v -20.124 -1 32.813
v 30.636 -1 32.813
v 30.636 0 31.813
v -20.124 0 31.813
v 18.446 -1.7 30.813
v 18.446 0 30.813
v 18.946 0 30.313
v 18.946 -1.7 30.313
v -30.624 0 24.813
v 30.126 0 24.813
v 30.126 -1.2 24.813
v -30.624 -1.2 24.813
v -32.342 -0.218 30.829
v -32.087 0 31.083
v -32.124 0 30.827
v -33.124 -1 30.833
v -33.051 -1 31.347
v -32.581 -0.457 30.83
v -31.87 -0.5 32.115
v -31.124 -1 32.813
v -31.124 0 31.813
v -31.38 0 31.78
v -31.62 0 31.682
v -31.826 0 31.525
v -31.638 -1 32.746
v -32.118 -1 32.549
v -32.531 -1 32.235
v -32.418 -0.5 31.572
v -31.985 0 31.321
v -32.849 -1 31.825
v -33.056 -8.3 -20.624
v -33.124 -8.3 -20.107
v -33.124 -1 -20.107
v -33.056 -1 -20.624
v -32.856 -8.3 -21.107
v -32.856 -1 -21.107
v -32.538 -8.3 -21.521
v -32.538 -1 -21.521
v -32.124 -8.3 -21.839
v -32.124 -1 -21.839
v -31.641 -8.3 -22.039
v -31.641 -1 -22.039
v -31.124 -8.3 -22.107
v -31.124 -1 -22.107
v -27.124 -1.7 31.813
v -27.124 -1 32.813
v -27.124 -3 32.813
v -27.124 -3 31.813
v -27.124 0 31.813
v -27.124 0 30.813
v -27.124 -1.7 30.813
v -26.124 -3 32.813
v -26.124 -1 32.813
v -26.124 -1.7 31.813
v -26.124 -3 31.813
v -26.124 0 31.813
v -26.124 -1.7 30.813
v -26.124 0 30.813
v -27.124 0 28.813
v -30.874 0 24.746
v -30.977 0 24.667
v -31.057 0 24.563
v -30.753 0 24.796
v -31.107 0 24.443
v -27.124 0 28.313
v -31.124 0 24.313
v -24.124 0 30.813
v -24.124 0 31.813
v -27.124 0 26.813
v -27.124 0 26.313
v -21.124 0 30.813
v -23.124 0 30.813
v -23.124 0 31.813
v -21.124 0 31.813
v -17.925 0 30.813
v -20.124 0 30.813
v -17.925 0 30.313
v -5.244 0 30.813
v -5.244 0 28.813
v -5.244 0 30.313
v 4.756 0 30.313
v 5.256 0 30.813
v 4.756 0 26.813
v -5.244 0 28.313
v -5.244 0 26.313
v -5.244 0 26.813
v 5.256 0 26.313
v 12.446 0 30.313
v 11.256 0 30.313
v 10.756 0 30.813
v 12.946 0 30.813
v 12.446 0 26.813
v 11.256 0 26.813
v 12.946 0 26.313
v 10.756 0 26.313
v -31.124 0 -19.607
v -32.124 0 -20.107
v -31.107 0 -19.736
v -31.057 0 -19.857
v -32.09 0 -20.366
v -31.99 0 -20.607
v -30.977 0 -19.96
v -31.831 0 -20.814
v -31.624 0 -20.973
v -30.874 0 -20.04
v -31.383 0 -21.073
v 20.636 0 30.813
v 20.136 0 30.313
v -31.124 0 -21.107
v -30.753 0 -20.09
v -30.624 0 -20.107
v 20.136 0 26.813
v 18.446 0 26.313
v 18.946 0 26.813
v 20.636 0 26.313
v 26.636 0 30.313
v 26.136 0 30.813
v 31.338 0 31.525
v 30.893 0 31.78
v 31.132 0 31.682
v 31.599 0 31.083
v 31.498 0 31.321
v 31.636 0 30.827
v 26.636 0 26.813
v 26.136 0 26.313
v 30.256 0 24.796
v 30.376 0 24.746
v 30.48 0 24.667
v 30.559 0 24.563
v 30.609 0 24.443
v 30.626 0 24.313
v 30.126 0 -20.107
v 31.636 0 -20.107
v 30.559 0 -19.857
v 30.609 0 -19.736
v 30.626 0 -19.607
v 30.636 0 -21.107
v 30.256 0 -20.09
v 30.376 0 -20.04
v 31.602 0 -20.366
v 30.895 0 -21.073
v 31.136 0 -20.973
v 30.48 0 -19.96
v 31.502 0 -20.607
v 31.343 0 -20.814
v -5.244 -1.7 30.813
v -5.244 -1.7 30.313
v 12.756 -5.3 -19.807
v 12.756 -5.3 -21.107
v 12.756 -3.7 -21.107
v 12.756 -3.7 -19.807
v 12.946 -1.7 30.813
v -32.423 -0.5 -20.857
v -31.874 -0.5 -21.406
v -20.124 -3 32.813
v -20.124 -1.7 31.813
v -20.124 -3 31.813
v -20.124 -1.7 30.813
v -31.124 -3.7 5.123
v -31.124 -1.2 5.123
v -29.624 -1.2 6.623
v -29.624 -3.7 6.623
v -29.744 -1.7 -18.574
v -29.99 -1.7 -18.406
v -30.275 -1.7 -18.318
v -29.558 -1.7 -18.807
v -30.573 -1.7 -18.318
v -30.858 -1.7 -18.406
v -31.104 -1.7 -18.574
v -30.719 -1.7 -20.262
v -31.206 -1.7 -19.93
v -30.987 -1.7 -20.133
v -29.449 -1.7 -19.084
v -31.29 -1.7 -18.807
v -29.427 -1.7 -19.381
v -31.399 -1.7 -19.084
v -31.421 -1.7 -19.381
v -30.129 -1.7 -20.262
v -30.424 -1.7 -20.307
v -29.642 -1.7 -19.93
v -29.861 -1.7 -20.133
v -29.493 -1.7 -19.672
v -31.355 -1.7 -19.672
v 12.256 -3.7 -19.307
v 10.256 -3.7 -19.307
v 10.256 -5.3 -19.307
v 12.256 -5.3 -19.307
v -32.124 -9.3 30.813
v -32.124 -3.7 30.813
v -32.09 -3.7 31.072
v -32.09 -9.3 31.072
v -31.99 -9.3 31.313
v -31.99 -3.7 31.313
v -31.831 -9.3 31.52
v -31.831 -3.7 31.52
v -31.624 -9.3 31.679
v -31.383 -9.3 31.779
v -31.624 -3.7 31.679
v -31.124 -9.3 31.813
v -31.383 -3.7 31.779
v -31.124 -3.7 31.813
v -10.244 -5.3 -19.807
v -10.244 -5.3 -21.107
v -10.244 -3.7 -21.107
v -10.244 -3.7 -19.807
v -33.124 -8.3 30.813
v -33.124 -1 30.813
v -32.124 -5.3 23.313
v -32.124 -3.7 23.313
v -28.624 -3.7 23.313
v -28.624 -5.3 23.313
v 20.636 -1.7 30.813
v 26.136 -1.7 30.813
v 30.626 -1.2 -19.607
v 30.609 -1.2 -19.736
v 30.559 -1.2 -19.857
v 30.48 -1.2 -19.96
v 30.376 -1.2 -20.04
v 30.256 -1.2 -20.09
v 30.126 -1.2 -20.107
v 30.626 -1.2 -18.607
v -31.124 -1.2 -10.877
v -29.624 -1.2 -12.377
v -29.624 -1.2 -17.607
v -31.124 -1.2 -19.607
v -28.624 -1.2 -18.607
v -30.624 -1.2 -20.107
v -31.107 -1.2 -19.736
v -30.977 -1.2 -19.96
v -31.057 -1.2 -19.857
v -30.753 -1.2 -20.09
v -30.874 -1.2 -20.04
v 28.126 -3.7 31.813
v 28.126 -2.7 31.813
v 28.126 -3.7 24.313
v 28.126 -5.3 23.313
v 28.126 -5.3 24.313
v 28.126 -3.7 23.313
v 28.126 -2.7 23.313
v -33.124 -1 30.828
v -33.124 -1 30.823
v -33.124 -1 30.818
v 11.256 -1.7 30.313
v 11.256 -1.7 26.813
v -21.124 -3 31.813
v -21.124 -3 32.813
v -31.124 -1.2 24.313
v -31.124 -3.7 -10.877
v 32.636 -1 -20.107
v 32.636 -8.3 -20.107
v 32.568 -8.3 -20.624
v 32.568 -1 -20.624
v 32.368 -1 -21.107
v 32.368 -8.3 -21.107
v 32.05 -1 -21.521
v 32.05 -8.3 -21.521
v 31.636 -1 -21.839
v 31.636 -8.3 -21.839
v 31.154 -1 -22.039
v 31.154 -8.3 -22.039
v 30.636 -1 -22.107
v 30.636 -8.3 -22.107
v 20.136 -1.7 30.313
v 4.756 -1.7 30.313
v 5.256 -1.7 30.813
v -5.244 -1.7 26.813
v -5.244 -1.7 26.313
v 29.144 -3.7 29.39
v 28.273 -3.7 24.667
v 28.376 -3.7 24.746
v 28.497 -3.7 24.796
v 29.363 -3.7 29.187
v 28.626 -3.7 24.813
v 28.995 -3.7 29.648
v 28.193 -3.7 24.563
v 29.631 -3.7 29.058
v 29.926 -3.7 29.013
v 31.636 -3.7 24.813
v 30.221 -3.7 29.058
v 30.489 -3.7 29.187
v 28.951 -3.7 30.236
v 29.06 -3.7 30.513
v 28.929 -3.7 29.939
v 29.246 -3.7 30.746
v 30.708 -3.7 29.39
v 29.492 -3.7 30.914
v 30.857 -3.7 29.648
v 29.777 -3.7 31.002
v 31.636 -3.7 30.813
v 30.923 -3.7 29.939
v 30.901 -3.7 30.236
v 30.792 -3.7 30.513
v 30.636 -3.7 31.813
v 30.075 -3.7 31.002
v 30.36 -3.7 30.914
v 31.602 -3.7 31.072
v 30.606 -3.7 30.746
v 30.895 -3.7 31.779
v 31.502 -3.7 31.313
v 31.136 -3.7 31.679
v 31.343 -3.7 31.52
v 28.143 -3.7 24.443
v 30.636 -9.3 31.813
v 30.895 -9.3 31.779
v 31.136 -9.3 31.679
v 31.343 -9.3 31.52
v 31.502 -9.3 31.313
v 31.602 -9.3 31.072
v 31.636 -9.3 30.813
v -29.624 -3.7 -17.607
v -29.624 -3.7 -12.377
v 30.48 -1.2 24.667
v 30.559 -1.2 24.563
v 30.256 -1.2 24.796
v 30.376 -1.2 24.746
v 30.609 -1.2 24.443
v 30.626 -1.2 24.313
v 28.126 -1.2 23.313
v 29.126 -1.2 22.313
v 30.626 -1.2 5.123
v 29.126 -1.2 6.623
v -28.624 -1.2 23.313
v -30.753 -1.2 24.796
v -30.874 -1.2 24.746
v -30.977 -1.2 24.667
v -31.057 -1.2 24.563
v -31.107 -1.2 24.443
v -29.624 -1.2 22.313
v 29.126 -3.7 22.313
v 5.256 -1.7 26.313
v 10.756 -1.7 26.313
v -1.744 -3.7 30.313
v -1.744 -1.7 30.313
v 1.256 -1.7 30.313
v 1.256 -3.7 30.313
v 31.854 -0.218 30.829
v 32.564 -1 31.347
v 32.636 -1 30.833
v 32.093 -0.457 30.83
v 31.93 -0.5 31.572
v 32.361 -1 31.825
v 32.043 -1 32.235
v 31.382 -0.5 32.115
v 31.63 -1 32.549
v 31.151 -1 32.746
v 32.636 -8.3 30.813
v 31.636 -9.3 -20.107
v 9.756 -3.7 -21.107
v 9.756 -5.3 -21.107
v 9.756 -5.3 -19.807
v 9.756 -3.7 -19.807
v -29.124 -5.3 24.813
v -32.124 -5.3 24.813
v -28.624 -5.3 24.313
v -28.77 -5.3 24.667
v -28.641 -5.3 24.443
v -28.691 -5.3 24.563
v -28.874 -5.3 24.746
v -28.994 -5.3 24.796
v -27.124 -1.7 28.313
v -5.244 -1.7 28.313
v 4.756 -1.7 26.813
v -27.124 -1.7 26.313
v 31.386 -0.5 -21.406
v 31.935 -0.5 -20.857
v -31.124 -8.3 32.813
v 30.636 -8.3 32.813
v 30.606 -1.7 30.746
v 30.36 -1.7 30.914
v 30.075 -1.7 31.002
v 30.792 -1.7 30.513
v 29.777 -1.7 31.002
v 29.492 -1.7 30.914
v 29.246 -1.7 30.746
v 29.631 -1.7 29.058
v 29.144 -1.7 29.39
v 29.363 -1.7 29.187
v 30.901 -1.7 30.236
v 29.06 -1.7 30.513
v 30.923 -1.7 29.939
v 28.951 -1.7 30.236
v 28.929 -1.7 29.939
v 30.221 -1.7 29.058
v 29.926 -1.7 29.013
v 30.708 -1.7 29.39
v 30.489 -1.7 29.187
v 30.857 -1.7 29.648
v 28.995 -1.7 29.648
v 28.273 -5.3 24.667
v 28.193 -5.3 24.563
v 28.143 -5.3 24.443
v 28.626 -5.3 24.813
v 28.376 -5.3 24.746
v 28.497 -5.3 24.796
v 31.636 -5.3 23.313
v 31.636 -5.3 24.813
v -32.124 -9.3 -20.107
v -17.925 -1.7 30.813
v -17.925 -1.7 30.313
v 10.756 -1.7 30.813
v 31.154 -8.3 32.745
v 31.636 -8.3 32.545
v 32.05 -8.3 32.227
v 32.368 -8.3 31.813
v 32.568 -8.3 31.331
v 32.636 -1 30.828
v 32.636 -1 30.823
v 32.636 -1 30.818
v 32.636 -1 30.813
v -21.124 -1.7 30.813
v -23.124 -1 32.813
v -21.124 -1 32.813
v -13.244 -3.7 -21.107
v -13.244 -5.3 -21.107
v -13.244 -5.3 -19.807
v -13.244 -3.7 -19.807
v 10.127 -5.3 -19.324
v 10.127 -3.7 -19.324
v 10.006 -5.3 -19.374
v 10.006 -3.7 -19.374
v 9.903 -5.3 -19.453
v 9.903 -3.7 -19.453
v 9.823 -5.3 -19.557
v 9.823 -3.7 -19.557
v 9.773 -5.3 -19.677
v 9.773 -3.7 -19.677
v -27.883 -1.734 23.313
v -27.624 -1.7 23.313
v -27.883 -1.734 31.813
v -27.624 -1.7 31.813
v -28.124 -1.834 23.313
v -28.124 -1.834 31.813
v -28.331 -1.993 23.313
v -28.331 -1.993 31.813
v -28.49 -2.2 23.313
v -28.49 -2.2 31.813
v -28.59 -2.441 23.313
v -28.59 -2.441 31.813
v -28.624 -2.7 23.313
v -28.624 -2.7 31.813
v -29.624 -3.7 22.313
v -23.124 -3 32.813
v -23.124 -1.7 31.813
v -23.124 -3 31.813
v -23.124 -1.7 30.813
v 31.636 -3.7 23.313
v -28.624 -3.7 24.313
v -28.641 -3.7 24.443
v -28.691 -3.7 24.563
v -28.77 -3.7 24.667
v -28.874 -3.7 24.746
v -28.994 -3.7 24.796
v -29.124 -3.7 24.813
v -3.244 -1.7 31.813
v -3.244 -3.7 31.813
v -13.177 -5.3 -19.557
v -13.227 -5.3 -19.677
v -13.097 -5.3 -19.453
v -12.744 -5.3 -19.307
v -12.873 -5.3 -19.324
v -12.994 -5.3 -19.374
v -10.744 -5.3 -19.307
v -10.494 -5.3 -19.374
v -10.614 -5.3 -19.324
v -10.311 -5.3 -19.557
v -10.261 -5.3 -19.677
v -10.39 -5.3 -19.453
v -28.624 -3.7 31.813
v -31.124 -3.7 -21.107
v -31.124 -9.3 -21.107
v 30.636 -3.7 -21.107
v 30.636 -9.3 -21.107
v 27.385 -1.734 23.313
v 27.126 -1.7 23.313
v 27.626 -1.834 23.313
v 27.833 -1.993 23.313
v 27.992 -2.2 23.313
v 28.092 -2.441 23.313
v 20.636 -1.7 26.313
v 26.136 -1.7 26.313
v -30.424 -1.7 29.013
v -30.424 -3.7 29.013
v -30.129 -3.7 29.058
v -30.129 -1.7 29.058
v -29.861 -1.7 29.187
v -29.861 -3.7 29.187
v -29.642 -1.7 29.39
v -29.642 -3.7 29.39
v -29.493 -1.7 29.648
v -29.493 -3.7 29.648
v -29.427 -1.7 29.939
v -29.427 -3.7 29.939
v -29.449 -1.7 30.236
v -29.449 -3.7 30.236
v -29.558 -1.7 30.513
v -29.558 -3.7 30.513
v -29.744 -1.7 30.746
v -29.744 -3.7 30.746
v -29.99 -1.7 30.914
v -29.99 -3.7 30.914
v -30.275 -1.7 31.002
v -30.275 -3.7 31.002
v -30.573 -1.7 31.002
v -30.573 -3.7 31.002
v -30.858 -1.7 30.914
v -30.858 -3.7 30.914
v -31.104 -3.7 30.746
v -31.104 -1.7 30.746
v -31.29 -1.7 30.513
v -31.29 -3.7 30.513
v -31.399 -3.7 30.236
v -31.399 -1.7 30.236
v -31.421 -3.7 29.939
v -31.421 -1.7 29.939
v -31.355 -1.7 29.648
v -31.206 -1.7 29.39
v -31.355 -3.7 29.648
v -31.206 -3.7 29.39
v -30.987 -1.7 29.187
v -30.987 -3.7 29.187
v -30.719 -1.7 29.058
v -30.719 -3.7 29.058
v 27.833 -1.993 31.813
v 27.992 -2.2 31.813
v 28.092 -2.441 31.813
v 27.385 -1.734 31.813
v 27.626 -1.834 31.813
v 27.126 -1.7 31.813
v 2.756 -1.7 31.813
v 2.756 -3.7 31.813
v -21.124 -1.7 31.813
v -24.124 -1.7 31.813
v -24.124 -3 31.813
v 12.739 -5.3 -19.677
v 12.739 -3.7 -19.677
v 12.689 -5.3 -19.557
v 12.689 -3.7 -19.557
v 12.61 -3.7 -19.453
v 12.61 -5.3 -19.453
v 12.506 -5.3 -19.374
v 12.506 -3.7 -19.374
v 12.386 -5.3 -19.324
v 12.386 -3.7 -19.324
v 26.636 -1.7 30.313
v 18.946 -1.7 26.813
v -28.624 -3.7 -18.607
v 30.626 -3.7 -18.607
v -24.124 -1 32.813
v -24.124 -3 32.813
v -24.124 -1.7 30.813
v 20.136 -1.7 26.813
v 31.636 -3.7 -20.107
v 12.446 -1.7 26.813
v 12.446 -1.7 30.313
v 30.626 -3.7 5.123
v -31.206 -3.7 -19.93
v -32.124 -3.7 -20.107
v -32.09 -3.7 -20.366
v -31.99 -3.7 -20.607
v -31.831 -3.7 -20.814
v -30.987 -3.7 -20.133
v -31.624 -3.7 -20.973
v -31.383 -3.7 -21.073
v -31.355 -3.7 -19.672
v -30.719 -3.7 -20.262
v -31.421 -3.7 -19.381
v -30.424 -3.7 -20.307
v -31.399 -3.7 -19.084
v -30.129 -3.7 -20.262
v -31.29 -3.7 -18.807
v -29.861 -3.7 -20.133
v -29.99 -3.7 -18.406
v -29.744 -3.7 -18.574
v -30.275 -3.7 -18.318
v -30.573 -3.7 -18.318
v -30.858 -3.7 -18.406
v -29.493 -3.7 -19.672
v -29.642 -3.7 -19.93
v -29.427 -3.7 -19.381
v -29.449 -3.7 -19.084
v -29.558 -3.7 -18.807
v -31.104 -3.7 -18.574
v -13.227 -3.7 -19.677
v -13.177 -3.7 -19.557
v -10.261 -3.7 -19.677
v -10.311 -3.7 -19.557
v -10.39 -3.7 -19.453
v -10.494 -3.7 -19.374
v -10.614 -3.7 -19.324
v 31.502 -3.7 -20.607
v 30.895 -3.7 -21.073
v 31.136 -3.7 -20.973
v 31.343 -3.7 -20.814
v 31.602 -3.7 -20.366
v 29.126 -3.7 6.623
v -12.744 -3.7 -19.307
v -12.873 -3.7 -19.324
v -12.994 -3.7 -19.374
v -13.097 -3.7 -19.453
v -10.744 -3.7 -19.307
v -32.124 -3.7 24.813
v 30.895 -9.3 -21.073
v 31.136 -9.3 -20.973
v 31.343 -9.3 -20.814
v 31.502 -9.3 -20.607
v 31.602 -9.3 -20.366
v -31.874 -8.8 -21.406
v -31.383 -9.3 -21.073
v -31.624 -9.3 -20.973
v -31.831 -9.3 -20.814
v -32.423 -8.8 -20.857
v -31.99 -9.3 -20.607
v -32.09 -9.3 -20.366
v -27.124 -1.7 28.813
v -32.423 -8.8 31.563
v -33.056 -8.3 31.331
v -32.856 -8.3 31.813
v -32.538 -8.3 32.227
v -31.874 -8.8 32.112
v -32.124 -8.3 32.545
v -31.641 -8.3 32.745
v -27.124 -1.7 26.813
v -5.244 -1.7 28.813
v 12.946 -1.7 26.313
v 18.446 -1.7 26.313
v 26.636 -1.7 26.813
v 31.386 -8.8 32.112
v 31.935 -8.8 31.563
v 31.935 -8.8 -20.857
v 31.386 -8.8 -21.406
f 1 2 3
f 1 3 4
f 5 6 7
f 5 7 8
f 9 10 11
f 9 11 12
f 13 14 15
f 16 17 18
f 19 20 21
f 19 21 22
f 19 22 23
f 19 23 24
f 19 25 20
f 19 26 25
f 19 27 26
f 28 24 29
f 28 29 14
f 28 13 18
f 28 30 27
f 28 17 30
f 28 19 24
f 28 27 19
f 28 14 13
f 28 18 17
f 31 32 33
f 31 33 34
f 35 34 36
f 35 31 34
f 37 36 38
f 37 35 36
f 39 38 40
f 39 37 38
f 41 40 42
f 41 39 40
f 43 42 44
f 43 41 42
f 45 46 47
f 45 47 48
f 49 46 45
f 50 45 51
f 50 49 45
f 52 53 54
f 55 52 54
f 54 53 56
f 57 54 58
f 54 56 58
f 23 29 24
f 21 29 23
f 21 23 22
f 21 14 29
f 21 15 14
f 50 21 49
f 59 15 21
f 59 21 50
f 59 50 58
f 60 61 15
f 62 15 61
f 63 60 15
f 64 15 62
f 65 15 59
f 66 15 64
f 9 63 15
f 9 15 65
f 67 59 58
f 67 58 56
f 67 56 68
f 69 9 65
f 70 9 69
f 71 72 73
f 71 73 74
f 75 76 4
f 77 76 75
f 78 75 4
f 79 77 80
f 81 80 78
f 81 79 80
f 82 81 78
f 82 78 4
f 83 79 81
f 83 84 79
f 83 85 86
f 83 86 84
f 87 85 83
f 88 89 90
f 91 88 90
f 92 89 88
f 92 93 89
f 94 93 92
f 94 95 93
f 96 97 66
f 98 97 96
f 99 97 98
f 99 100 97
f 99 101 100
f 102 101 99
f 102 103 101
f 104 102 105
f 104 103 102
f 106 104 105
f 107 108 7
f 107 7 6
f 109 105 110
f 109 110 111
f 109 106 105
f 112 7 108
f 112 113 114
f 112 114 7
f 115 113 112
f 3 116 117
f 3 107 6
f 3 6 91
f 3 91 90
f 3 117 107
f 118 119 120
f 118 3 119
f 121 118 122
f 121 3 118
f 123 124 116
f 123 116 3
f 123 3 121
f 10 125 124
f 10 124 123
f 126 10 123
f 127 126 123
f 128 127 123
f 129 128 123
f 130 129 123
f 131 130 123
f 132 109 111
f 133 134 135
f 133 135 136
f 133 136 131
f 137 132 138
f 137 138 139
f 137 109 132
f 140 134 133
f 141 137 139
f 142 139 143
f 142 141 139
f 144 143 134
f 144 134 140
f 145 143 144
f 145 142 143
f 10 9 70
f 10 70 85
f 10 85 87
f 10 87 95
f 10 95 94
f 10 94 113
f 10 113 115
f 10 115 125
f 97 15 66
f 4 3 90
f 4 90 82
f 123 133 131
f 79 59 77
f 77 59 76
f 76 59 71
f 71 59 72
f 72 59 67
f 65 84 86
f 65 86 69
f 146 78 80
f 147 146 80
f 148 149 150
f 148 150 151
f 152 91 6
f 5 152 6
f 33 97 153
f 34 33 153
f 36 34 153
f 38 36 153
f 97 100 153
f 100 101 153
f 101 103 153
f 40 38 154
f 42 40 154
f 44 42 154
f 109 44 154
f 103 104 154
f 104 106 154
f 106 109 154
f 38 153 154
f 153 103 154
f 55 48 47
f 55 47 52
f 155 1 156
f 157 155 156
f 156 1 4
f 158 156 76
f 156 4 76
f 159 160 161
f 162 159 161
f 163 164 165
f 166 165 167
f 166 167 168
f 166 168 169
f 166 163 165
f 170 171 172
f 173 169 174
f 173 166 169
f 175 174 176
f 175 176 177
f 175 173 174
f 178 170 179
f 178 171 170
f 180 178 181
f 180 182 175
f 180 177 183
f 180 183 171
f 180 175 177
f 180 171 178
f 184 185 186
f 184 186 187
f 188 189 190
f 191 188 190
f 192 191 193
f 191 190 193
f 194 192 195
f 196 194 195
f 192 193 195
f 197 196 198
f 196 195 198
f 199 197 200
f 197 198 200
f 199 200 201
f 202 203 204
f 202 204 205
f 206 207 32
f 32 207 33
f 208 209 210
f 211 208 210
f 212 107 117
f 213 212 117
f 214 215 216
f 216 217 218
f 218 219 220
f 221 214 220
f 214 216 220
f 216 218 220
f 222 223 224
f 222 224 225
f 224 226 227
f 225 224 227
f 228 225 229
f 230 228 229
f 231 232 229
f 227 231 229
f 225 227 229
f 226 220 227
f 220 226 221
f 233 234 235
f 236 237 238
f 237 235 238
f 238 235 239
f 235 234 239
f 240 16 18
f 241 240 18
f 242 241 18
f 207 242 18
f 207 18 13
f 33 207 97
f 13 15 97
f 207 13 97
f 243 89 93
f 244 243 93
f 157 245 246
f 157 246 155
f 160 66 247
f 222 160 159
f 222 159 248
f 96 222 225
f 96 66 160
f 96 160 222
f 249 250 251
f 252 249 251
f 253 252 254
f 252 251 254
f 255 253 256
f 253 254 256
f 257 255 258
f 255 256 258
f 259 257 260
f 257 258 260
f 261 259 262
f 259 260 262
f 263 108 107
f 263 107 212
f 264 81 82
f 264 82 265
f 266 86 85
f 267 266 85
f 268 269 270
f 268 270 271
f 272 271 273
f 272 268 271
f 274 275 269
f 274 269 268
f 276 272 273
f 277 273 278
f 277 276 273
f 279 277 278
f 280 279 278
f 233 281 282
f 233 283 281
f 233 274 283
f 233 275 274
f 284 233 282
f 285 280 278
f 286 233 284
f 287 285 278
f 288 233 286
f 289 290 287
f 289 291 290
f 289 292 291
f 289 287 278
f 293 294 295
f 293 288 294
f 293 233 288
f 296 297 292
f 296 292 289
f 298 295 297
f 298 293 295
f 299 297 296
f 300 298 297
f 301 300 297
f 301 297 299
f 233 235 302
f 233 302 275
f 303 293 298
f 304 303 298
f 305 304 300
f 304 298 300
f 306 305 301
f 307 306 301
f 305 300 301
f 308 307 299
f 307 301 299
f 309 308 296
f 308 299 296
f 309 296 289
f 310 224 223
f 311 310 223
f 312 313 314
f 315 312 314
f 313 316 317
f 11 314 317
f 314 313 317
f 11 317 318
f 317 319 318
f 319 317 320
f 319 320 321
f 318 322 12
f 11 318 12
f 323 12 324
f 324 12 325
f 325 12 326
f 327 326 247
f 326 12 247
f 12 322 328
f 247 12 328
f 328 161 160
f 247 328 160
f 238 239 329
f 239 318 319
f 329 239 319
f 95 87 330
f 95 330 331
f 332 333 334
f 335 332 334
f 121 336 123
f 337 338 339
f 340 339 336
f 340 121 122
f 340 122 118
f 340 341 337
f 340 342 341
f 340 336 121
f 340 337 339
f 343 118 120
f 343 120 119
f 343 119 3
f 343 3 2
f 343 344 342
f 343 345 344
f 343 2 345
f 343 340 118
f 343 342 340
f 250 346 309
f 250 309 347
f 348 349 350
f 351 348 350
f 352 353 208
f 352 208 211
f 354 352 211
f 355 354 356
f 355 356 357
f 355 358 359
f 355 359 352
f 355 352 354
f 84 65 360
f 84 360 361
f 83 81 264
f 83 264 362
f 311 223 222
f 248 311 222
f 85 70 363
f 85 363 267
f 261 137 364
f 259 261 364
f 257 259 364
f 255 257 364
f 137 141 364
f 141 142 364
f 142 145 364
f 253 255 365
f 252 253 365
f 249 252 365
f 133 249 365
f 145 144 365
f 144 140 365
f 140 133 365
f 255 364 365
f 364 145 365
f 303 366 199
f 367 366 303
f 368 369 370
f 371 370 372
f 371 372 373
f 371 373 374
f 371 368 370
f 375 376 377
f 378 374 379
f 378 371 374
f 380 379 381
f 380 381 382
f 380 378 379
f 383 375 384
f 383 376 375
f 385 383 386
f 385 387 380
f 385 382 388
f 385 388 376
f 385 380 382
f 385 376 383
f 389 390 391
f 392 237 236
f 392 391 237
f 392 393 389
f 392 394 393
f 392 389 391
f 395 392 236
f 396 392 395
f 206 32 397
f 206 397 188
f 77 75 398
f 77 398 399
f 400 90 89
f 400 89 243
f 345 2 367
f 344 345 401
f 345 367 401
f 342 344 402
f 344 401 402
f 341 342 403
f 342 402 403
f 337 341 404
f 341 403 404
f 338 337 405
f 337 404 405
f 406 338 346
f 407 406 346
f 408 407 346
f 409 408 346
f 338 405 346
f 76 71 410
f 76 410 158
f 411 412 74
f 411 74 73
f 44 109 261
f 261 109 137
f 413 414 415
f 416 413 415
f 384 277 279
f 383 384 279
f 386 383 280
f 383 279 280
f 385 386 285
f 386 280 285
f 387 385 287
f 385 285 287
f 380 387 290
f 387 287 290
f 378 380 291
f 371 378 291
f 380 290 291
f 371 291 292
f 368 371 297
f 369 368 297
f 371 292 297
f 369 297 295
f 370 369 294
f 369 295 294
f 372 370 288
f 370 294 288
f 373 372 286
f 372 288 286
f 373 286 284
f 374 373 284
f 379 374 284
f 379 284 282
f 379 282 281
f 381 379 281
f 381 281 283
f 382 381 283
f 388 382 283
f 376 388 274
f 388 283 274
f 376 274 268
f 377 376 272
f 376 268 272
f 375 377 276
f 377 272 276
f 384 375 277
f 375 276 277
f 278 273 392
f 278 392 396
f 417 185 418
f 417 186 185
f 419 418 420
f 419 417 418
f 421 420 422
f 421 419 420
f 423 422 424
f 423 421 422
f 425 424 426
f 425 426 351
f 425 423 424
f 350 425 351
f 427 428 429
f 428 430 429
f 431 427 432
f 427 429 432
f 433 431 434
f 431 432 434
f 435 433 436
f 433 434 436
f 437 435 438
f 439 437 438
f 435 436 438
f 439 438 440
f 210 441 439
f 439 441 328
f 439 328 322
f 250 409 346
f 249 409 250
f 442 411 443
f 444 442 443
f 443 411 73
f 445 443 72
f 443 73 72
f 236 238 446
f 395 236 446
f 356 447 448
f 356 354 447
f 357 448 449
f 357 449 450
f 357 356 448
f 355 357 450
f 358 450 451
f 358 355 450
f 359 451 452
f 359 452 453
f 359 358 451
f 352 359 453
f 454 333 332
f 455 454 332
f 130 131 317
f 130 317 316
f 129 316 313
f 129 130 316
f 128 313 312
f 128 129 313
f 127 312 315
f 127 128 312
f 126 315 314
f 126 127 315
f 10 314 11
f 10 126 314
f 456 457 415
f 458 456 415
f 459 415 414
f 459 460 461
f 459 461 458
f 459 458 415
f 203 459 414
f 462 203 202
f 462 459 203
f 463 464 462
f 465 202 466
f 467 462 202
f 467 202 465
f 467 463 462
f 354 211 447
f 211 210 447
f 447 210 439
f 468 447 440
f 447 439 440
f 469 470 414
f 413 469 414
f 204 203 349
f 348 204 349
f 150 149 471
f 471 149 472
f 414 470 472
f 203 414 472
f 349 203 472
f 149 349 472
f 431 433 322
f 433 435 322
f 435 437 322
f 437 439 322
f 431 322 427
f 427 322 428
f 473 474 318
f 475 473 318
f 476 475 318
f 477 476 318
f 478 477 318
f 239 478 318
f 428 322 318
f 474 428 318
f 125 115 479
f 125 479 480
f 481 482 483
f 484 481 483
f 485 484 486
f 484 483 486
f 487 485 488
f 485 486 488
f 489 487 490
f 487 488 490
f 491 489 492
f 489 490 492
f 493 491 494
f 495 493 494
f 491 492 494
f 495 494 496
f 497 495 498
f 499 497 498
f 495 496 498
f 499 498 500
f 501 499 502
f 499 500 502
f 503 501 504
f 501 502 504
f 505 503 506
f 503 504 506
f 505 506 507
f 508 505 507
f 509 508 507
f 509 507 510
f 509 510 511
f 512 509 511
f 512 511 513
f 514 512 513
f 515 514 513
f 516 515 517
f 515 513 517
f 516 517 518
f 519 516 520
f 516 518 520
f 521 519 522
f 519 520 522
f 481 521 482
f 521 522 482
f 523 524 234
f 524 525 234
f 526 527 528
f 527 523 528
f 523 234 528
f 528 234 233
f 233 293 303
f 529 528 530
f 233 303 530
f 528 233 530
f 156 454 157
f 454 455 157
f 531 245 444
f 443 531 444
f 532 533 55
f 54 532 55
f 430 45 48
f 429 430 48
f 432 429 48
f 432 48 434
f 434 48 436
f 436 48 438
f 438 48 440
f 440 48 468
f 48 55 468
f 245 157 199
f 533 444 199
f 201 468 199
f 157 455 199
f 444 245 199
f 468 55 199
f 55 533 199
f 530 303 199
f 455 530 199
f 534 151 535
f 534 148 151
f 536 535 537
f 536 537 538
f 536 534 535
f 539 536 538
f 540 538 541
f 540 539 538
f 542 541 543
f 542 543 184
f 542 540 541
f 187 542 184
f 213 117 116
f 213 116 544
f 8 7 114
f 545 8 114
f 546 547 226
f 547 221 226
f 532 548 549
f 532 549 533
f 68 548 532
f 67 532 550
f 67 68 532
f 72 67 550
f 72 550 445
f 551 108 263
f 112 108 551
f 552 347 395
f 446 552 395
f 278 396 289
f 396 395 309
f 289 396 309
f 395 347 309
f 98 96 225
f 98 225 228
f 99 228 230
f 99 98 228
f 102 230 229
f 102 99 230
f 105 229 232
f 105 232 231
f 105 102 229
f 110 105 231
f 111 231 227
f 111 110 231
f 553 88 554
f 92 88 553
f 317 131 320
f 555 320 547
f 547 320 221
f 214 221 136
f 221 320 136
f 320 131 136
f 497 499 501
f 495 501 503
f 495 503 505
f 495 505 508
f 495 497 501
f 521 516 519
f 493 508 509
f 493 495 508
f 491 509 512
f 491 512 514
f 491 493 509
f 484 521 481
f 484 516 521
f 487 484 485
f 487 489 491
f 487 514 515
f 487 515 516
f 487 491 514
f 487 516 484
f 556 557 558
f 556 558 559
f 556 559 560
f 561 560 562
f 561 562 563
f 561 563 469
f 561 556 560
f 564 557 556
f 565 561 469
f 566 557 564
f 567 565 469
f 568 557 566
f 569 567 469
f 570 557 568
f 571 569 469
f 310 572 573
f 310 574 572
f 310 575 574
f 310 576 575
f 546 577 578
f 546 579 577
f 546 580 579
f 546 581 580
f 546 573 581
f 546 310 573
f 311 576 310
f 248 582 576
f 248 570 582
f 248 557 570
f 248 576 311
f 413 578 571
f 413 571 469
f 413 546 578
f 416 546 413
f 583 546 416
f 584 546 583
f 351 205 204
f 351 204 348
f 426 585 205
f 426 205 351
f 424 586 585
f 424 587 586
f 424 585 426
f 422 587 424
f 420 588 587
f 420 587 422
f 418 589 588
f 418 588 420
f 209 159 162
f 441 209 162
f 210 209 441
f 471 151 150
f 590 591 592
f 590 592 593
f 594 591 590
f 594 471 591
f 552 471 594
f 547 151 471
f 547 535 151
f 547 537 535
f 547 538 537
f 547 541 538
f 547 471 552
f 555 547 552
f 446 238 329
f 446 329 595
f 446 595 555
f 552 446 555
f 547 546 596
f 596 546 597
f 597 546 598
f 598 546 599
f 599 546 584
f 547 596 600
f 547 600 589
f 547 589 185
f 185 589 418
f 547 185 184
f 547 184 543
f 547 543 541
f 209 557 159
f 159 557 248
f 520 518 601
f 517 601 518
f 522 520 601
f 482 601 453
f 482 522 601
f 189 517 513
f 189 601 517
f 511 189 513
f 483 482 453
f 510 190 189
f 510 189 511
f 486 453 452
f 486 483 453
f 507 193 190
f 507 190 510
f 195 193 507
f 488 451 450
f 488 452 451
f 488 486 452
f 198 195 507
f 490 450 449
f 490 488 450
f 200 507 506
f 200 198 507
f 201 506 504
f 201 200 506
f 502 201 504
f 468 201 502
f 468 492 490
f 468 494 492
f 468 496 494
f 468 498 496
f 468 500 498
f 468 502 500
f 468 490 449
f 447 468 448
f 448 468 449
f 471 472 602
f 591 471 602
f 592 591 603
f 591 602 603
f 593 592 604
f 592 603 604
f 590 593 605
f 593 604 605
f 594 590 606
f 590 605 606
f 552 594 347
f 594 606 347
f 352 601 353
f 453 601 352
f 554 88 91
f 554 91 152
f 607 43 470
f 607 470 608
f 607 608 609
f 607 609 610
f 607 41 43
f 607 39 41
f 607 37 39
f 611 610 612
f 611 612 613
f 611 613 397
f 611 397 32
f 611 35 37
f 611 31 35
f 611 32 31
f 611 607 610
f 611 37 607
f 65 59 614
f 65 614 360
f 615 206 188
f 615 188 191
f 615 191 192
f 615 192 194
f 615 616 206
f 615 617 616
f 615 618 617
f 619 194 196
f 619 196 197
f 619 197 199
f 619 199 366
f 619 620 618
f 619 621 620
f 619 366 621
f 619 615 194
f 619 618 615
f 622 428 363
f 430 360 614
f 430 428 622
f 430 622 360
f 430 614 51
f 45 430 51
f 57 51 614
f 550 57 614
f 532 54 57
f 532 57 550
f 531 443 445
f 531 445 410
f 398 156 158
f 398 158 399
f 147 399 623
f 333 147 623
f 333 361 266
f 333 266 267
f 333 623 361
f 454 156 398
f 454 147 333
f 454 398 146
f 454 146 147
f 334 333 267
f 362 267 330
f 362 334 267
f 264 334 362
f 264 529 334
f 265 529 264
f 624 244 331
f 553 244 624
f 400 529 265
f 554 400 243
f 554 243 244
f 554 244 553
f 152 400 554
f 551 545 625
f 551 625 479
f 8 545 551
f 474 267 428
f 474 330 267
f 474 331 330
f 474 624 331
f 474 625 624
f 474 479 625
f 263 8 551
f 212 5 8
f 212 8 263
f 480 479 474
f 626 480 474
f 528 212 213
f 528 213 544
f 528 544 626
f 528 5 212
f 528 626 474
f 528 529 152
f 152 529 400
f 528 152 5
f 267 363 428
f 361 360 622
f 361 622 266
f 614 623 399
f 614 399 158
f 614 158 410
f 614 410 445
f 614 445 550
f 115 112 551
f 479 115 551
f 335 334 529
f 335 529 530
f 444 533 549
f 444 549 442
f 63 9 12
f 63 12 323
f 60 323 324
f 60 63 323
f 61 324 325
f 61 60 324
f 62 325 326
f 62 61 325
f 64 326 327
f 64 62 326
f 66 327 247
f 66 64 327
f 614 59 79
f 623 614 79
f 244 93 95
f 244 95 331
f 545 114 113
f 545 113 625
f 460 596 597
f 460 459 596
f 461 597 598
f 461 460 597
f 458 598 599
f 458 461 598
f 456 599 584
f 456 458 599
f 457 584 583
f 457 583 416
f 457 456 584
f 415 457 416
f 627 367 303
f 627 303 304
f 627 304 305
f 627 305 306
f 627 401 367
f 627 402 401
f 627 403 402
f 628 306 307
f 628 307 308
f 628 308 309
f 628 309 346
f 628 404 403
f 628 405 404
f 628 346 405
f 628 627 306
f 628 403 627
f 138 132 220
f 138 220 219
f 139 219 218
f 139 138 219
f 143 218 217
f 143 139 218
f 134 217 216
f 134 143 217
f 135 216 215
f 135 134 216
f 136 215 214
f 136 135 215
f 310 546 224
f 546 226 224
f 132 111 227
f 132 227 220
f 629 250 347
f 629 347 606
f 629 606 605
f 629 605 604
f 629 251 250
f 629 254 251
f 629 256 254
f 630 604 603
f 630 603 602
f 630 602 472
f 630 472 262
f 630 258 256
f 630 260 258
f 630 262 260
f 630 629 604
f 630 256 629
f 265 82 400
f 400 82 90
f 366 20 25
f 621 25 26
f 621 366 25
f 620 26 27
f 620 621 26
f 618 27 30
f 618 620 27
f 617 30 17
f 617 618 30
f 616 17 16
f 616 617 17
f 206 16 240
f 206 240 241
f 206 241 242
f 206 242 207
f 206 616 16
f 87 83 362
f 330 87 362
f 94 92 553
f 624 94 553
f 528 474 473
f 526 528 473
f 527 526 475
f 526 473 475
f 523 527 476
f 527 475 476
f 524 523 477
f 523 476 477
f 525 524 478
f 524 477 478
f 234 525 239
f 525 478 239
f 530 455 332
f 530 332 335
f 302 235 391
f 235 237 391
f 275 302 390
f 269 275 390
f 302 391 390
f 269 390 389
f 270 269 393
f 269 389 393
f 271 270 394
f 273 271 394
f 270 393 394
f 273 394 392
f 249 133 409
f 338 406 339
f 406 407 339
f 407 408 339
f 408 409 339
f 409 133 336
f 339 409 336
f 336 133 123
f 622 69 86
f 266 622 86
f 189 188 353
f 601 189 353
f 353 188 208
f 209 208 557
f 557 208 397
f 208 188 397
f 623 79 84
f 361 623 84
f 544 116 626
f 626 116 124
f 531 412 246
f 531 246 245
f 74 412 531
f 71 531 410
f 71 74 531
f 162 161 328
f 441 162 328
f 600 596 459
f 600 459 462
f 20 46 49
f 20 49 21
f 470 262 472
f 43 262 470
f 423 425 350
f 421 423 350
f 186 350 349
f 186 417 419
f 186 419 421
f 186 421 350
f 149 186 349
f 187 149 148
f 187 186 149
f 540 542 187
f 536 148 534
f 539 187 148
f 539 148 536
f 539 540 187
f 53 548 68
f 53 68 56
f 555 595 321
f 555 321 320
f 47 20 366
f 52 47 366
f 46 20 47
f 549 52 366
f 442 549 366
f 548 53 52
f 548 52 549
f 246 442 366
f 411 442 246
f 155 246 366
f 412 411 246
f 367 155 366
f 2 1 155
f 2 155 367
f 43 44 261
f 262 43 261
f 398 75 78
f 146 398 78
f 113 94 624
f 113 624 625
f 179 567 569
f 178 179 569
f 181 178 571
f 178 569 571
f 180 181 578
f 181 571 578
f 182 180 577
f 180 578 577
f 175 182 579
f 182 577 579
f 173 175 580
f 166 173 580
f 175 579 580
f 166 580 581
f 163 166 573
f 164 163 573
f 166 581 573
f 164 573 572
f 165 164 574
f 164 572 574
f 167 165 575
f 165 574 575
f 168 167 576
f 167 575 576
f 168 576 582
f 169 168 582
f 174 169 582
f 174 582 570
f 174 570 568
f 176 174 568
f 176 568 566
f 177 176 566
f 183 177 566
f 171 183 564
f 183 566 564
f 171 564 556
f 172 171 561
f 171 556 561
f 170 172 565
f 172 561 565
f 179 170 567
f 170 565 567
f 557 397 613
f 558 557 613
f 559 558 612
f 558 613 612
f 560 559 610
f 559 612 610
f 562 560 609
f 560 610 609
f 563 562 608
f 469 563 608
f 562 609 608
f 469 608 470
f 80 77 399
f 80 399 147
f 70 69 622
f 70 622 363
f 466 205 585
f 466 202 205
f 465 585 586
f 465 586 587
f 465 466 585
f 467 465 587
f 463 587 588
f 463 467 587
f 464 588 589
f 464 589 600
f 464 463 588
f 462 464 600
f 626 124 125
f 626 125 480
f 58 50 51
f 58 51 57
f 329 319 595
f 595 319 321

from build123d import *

# Parameters (mm, degrees)
SKETCH_1_W           = 65.76
SKETCH_1_H           = 54.92
EXTRUDE_1_DEPTH      = 9.3
FILLET_1_R           = 2
CUT_EXTRUDE_1_DEPTH  = 1.2
SKETCH_3_W           = 58.75
SKETCH_3_H           = 41.92
CUT_EXTRUDE_2_DEPTH  = 1
CHAMFER_2_SIZE       = 1
SKETCH_7_W           = 2
SKETCH_7_H           = 41.92
CUT_EXTRUDE_5_DEPTH  = 48.162577855
CUT_EXTRUDE_6_DEPTH  = 5.8
SKETCH_10_W          = 1.5
SKETCH_10_H          = 22.23
CUT_EXTRUDE_7_DEPTH  = 1
CHAMFER_8_SIZE       = 3
CHAMFER_9_SIZE       = 1
FILLET_2_R           = 2
CHAMFER_11_SIZE      = 1
FILLET_3_R           = 1
SKETCH_14_W          = 12.681422007
SKETCH_14_H          = 0.5
SKETCH_14_W_2        = 21.88
SKETCH_14_W_3        = 6.5
SKETCH_14_H_2        = 4.5
CUT_EXTRUDE_9_DEPTH  = 48.543545828
CHAMFER_14_SIZE      = 0.5
SKETCH_14_3_W        = 1
SKETCH_14_3_H        = 2
CUT_EXTRUDE_10_DEPTH = 3
CUT_EXTRUDE_11_DEPTH = 1.8
EXTRUDE_3_DEPTH      = 2
FILLET_5_R           = 1
SKETCH_23_R          = 1
CUT_EXTRUDE_14_DEPTH = 2
SKETCH_23_3_W        = 3
SKETCH_23_3_H        = 1.8
SKETCH_23_3_W_2      = 3.5
SKETCH_23_3_H_2      = 1.5
SKETCH_23_3_W_3      = 3.51
EXTRUDE_4_DEPTH      = 1.6
FILLET_7_R           = 0.5
SKETCH_26_W          = 3
SKETCH_26_H          = 1.5
EXTRUDE_6_DEPTH      = 2
CHAMFER_18_SIZE      = 1.5
CUT_EXTRUDE_15_DEPTH = 48.323448204
CHAMFER_19_SIZE      = 1


# Some blends are built 0.0001 mm under size
with BuildPart() as part:
    # 草图1 → 凸台-拉伸1 (new body)
    with BuildSketch(Plane(origin=(0, 0, 0), x_dir=(1, 0, 0), z_dir=(0, 1, 0))):
        with Locations((-0.243849372, -5.353249651)):
            Rectangle(SKETCH_1_W, SKETCH_1_H)
    extrude(amount=-EXTRUDE_1_DEPTH)

    # 圆角1
    fillet_1_edges = [part.edges().sort_by_distance(p)[0] for p in [
        (-33.123849372, -4.65, -22.106750349),
        (32.636150628, -4.65, -22.106750349),
    ]]
    fillet(fillet_1_edges, radius=FILLET_1_R)

    # 草图2 → 切除-拉伸1 (cut)
    with BuildSketch(Plane(origin=(0, 0, 0), x_dir=(1, 0, 0), z_dir=(0, 1, 0))):
        with BuildLine():
            Line((-30.623849372, 20.106750349), (30.126150628, 20.106750349))
            ThreePointArc((30.126150628, 20.106750349), (30.479704018, 19.960303739), (30.626150628, 19.606750349))
            Line((30.626150628, 19.606750349), (30.626150628, -24.313249651))
            ThreePointArc((30.626150628, -24.313249651), (30.479704018, -24.666803042), (30.126150628, -24.813249651))
            Line((30.126150628, -24.813249651), (-30.623849372, -24.813249651))
            ThreePointArc((-30.623849372, -24.813249651), (-30.977402763, -24.666803042), (-31.123849372, -24.313249651))
            Line((-31.123849372, -24.313249651), (-31.123849372, 19.606750349))
            ThreePointArc((-31.123849372, 19.606750349), (-30.977402763, 19.960303739), (-30.623849372, 20.106750349))
        make_face()
    extrude(amount=-CUT_EXTRUDE_1_DEPTH, mode=Mode.SUBTRACT)

    # 草图3 → 切除-拉伸2 (cut)
    with BuildSketch(Plane(origin=(0, -1.2, 0), x_dir=(1, 0, 0), z_dir=(0, 1, 0))):
        with Locations((-0.248849372, -2.353249651)):
            Rectangle(SKETCH_3_W, SKETCH_3_H)
    extrude(amount=-CUT_EXTRUDE_2_DEPTH, mode=Mode.SUBTRACT)

    # 倒角2
    chamfer_2_edges = [part.edges().sort_by_distance(p)[0] for p in [
        (-33.123849372, 0, 6.353249651),
        (-0.243849372, 0, -22.106750349),
        (-32.538062935, 0, -21.520963911),
        (32.05036419, 0, -21.520963911),
        (32.636150628, 0, 6.353249651),
    ]]
    chamfer(chamfer_2_edges, length=CHAMFER_2_SIZE)

    # 草图7 → 切除-拉伸5 (cut, through all)
    with BuildSketch(Plane(origin=(0, -2.2, 0), x_dir=(1, 0, 0), z_dir=(0, 1, 0))):
        with Locations((-28.623849372, -2.353249651)):
            Rectangle(SKETCH_7_W, SKETCH_7_H)
    extrude(amount=-CUT_EXTRUDE_5_DEPTH, mode=Mode.SUBTRACT)

    # 草图8 → 切除-拉伸6 (cut)
    with BuildSketch(Plane.XZ.offset(9.3)):
        with BuildLine():
            Line((-31.123849372, -21.106750349), (30.636150628, -21.106750349))
            ThreePointArc((30.636150628, -21.106750349), (31.343257409, -20.81385713), (31.636150628, -20.106750349))
            Line((31.636150628, -20.106750349), (31.636150628, 31.813249651))
            Line((31.636150628, 31.813249651), (-32.123849372, 31.813249651))
            Line((-32.123849372, 31.813249651), (-32.123849372, -20.106750349))
            ThreePointArc((-32.123849372, -20.106750349), (-31.830956154, -20.81385713), (-31.123849372, -21.106750349))
        make_face()
    extrude(amount=-CUT_EXTRUDE_6_DEPTH, mode=Mode.SUBTRACT)

    # 草图10 → 切除-拉伸7 (cut)
    with BuildSketch(Plane(origin=(0, -1.2, 0), x_dir=(1, 0, 0), z_dir=(0, 1, 0))):
        with Locations((29.876150628, 7.491750349)):
            Rectangle(SKETCH_10_W, SKETCH_10_H)
    extrude(amount=-CUT_EXTRUDE_7_DEPTH, mode=Mode.SUBTRACT)

    # 倒角8
    # the kernel refuses this chamfer: 3 mm, written as the material it takes off along each edge
    with BuildSketch(Plane(origin=(29.126150628, 6.515048964, 3.623249651), x_dir=(0.9996219169112968, 0, -0.027495876610586365), z_dir=(0, -1, 0))) as chamfer_8_piece_1_section:
        Polygon((CHAMFER_8_SIZE * 0.999621916911, CHAMFER_8_SIZE * 0.0274958766106), (-CHAMFER_8_SIZE * 0.0274958766106, CHAMFER_8_SIZE * 0.999621916911), (0, 0), align=None)
    chamfer_8_piece_1 = extrude(amount=8.715048964, mode=Mode.PRIVATE)
    chamfer_8_piece_1 = split(chamfer_8_piece_1, bisect_by=Plane(origin=(30.626150628, -1.7, 4.789916318), z_dir=(-1, 0, 0)), keep=Keep.TOP, mode=Mode.PRIVATE)
    add(chamfer_8_piece_1, mode=Mode.SUBTRACT)

    # 倒角9
    chamfer_9_edges = [part.edges().sort_by_distance(p)[0] for p in [
        (-29.623849372, -2.35, 23.313249651),
        (-29.623849372, -2.35, -18.606750349),
        (29.126150628, -1.7, 23.313249651),
    ]]
    chamfer(chamfer_9_edges, length=CHAMFER_9_SIZE)

    # 圆角2
    fillet_2_edges = [part.edges().sort_by_distance(p)[0] for p in [
        (32.636150628, -5.15, 32.813249651),
        (-33.123849372, -5.15, 32.813249651),
    ]]
    fillet(fillet_2_edges, radius=FILLET_2_R)

    # 倒角11
    chamfer_11_edges = [part.edges().sort_by_distance(p)[0] for p in [
        (-31.641487463, 0, 32.745101304),
        (31.153788718, 0, 32.745101304),
        (-0.243849372, 0, 32.813249651),
    ]]
    chamfer(chamfer_11_edges, length=CHAMFER_11_SIZE - 0.0001)  # a hair under: the kernel refuses the full size

    # 圆角3
    fillet_3_edges = [part.edges().sort_by_distance(p)[0] for p in [
        (-32.123849372, -6.4, 31.813249651),
        (31.636150628, -6.4, 31.813249651),
    ]]
    fillet(fillet_3_edges, radius=FILLET_3_R)

    # 草图14 → 切除-拉伸9 (cut, through all)
    with BuildSketch(Plane(origin=(0, 0, 0), x_dir=(1, 0, 0), z_dir=(0, 1, 0))):
        with Locations((-11.584560376, -30.563249651)):
            Rectangle(SKETCH_14_W, SKETCH_14_H)
        with Locations((-16.183849372, -26.563249651)):
            Rectangle(SKETCH_14_W_2, SKETCH_14_H)
        with Locations((-16.183849372, -28.563249651)):
            Rectangle(SKETCH_14_W_2, SKETCH_14_H)
        with Locations((8.006150628, -28.563249651)):
            Rectangle(SKETCH_14_W_3, SKETCH_14_H_2)
        with Locations((15.696150628, -28.563249651)):
            Rectangle(SKETCH_14_W_3, SKETCH_14_H_2)
        with Locations((23.386150628, -28.563249651)):
            Rectangle(SKETCH_14_W_3, SKETCH_14_H_2)
    extrude(amount=-CUT_EXTRUDE_9_DEPTH, mode=Mode.SUBTRACT)

    # 倒角14
    chamfer_14_edges = [part.edges().sort_by_distance(p)[0] for p in [
        (20.136150628, -1.75, 26.313249651),
        (26.636150628, -1.75, 26.313249651),
        (26.636150628, -1.75, 30.813249651),
        (20.136150628, -1.75, 30.813249651),
        (12.446150628, -1.75, 26.313249651),
        (18.946150628, -1.75, 26.313249651),
        (18.946150628, -1.75, 30.813249651),
        (12.446150628, -1.75, 30.813249651),
        (4.756150628, -1.75, 30.813249651),
        (4.756150628, -1.75, 26.313249651),
        (11.256150628, -1.75, 26.313249651),
        (11.256150628, -1.75, 30.813249651),
    ]]
    chamfer(chamfer_14_edges, length=CHAMFER_14_SIZE)

    # 草图14<3> → 切除-拉伸10 (cut)
    with BuildSketch(Plane(origin=(0, 0, 0), x_dir=(1, 0, 0), z_dir=(0, 1, 0))):
        with Locations((-26.623849372, -31.813249651)):
            Rectangle(SKETCH_14_3_W, SKETCH_14_3_H)
        with Locations((-23.623849372, -31.813249651)):
            Rectangle(SKETCH_14_3_W, SKETCH_14_3_H)
        with Locations((-20.623849372, -31.813249651)):
            Rectangle(SKETCH_14_3_W, SKETCH_14_3_H)
    extrude(amount=-CUT_EXTRUDE_10_DEPTH, mode=Mode.SUBTRACT)

    # 草图19 → 切除-拉伸11 (cut)
    with BuildSketch(Plane.XZ.offset(3.5)):
        with BuildLine():
            Line((30.636150628, 31.813249651), (-31.123849372, 31.813249651))
            ThreePointArc((-31.123849372, 31.813249651), (-31.830956154, 31.520356433), (-32.123849372, 30.813249651))
            Line((-32.123849372, 30.813249651), (-32.123849372, -20.106750349))
            ThreePointArc((-32.123849372, -20.106750349), (-31.830956154, -20.81385713), (-31.123849372, -21.106750349))
            Line((-31.123849372, -21.106750349), (30.636150628, -21.106750349))
            ThreePointArc((30.636150628, -21.106750349), (31.343257409, -20.81385713), (31.636150628, -20.106750349))
            Line((31.636150628, -20.106750349), (31.636150628, 30.813249651))
            ThreePointArc((31.636150628, 30.813249651), (31.343257409, 31.520356433), (30.636150628, 31.813249651))
        make_face()
    extrude(amount=-CUT_EXTRUDE_11_DEPTH, mode=Mode.SUBTRACT)

    # 草图22 → 凸台-拉伸3 (add)
    with BuildSketch(Plane.XZ.offset(1.7)):
        with BuildLine():
            Line((30.626150628, 5.123249651), (30.626150628, -18.606750349))
            Line((30.626150628, -18.606750349), (-28.623849372, -18.606750349))
            Line((-28.623849372, -18.606750349), (-29.623849372, -17.606750349))
            Line((-29.623849372, -17.606750349), (-29.623849372, 22.313249651))
            Line((-29.623849372, 22.313249651), (-28.623849372, 23.313249651))
            Line((-28.623849372, 23.313249651), (-28.623849372, 31.813249651))
            Line((-28.623849372, 31.813249651), (-31.123849372, 31.813249651))
            ThreePointArc((-31.123849372, 31.813249651), (-31.830956154, 31.520356433), (-32.123849372, 30.813249651))
            Line((-32.123849372, 30.813249651), (-32.123849372, -20.106750349))
            ThreePointArc((-32.123849372, -20.106750349), (-31.830956154, -20.81385713), (-31.123849372, -21.106750349))
            Line((-31.123849372, -21.106750349), (30.636150628, -21.106750349))
            ThreePointArc((30.636150628, -21.106750349), (31.343257409, -20.81385713), (31.636150628, -20.106750349))
            Line((31.636150628, -20.106750349), (31.636150628, 30.813249651))
            ThreePointArc((31.636150628, 30.813249651), (31.343257409, 31.520356433), (30.636150628, 31.813249651))
            Line((30.636150628, 31.813249651), (28.126150628, 31.813249651))
            Line((28.126150628, 31.813249651), (28.126150628, 23.313249651))
            Line((28.126150628, 23.313249651), (29.126150628, 22.313249651))
            Line((29.126150628, 22.313249651), (29.126150628, 6.623249651))
            Line((29.126150628, 6.623249651), (30.626150628, 5.123249651))
        make_face()
    extrude(amount=EXTRUDE_3_DEPTH)

    # 圆角5
    fillet_5_edges = [part.edges().sort_by_distance(p)[0] for p in [
        (-28.623849372, -1.7, 27.563249651),
        (28.126150628, -1.7, 27.563249651),
    ]]
    fillet(fillet_5_edges, radius=FILLET_5_R)

    # 草图23 → 切除-拉伸14 (cut)
    with BuildSketch(Plane.XZ.offset(3.7)):
        with Locations(Location((-30.423849372, 30.013249651, 0), (0, 0, 270))):
            Circle(SKETCH_23_R)
        with Locations(Location((-30.423849372, -19.306750349, 0), (0, 0, 270))):
            Circle(SKETCH_23_R)
        with Locations(Location((29.926150628, 30.013249651, 0), (0, 0, 270))):
            Circle(SKETCH_23_R)
    extrude(amount=-CUT_EXTRUDE_14_DEPTH, mode=Mode.SUBTRACT)

    # 草图23<3> → 凸台-拉伸4 (add)
    with BuildSketch(Plane.XZ.offset(3.7)):
        with Locations((-11.743849372, -20.206750349)):
            Rectangle(SKETCH_23_3_W, SKETCH_23_3_H)
        with Locations((-30.373849372, 24.063249651)):
            Rectangle(SKETCH_23_3_W_2, SKETCH_23_3_H_2)
        with Locations((29.881150628, 24.063249651)):
            Rectangle(SKETCH_23_3_W_3, SKETCH_23_3_H_2)
        with Locations((11.256150628, -20.206750349)):
            Rectangle(SKETCH_23_3_W, SKETCH_23_3_H)
    extrude(amount=EXTRUDE_4_DEPTH)

    # 圆角7
    fillet_7_edges = [part.edges().sort_by_distance(p)[0] for p in [
        (28.126150628, -4.5, 24.813249651),
        (-28.623849372, -4.5, 24.813249651),
        (-13.243849372, -4.5, -19.306750349),
        (-10.243849372, -4.5, -19.306750349),
        (9.756150628, -4.5, -19.306750349),
        (12.756150628, -4.5, -19.306750349),
    ]]
    fillet(fillet_7_edges, radius=FILLET_7_R)

    # 草图26 → 凸台-拉伸6 (add)
    with BuildSketch(Plane.XZ.offset(1.7)):
        with Locations((-0.243849372, 31.063249651)):
            Rectangle(SKETCH_26_W, SKETCH_26_H)
    extrude(amount=EXTRUDE_6_DEPTH)

    # 倒角18
    chamfer_18_edges = [part.edges().sort_by_distance(p)[0] for p in [
        (1.256150628, -2.7, 31.813249651),
        (-1.743849372, -2.7, 31.813249651),
    ]]
    chamfer(chamfer_18_edges, length=CHAMFER_18_SIZE - 0.0001)  # a hair under: the kernel refuses the full size

    # 草图28 → 切除-拉伸15 (cut, through all)
    with BuildSketch(Plane(origin=(0, -1.2, 0), x_dir=(1, 0, 0), z_dir=(0, 1, 0))):
        Polygon((-31.123849372, -5.123249651), (-29.623849372, -6.623249651), (-29.623849372, 12.376750349), (-31.123849372, 10.876750349), align=None)
    extrude(amount=-CUT_EXTRUDE_15_DEPTH, mode=Mode.SUBTRACT)

    # 倒角19
    chamfer_19_edges = [part.edges().sort_by_distance(p)[0] for p in [
        (-0.243849372, -9.3, 32.813249651),
        (32.636150628, -9.3, 5.353249651),
        (-32.538062935, -9.3, 32.227463214),
        (32.05036419, -9.3, 32.227463214),
        (-0.243849372, -9.3, -22.106750349),
        (-33.123849372, -9.3, 5.353249651),
        (-32.538062935, -9.3, -21.520963911),
        (32.05036419, -9.3, -21.520963911),
    ]]
    chamfer(chamfer_19_edges, length=CHAMFER_19_SIZE - 0.0001)  # a hair under: the kernel refuses the full size


solid = part.part
